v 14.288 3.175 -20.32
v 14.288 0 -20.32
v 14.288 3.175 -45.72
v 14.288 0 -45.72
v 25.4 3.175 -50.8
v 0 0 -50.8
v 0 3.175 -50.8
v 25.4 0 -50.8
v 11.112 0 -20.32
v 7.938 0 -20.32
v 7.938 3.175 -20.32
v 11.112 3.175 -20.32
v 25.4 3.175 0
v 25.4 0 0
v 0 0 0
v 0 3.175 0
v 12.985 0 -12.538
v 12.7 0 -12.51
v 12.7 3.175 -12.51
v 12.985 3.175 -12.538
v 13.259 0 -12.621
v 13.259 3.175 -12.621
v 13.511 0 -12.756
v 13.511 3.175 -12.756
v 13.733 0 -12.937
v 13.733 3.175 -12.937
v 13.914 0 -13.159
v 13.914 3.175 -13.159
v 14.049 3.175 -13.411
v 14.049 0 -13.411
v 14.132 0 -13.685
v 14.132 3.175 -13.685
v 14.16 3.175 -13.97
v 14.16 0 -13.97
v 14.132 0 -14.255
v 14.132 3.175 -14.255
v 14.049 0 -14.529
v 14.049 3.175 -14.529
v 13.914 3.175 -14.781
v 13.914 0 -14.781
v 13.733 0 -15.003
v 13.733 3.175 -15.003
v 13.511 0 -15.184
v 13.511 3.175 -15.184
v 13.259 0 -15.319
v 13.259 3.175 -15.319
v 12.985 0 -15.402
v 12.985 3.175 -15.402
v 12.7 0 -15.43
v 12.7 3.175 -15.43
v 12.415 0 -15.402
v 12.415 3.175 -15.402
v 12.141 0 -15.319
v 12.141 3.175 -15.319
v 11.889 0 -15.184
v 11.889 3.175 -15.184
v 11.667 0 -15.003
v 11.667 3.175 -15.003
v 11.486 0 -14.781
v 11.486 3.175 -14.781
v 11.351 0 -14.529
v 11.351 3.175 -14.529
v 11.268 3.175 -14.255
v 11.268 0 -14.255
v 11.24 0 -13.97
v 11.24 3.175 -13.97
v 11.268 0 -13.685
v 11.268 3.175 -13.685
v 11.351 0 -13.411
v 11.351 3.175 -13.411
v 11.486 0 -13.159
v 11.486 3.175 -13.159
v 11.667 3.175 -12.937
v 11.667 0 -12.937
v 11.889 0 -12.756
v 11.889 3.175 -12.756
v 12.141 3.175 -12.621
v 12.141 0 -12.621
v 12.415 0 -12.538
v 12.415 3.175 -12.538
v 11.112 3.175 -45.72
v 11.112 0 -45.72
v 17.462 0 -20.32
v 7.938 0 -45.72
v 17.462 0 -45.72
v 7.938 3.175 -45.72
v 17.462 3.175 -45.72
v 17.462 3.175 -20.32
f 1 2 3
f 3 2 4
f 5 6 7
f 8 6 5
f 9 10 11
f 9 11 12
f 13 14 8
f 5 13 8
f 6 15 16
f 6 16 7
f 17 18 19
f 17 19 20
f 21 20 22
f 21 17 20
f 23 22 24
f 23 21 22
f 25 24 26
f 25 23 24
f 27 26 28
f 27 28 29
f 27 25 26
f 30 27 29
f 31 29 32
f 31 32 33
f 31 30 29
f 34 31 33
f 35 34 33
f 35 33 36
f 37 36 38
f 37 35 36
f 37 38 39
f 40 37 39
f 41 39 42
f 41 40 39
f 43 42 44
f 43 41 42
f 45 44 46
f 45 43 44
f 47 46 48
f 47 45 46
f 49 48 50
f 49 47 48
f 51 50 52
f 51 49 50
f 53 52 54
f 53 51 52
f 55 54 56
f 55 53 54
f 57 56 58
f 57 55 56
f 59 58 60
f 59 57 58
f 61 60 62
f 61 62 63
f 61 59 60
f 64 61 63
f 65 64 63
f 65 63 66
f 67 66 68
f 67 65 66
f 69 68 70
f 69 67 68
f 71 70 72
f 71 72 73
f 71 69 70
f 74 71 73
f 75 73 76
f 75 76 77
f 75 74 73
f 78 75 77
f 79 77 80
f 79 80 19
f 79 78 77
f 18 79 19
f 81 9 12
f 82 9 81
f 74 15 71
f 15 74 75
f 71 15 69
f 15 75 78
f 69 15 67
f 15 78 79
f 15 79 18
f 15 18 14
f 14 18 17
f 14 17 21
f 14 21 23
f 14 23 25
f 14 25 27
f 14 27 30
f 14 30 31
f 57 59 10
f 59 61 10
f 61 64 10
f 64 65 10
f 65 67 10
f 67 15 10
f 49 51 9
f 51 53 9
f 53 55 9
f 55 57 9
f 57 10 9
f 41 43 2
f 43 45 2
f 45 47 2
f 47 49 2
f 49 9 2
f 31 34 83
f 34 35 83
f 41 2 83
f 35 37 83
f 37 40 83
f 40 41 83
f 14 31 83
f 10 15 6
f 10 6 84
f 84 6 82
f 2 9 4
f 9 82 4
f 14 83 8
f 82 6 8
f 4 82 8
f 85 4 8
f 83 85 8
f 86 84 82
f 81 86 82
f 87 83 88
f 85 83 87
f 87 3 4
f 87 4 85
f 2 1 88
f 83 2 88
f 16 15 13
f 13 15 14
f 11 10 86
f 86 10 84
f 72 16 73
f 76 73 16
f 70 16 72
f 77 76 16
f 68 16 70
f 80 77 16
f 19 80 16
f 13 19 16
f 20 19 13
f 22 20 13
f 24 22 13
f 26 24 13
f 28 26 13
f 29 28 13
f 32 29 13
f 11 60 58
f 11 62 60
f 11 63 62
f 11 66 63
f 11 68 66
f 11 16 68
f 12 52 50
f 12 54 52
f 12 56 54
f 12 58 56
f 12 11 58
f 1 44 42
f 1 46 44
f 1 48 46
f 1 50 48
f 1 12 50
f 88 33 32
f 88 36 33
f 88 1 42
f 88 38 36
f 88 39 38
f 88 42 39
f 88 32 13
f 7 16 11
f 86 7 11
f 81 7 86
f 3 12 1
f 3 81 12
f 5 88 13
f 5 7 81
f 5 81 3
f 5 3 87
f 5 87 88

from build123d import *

# Parameters (mm, degrees)
SKETCH1_W           = 25.4
SKETCH1_H           = 50.8
SKETCH1_R           = 1.4605
SKETCH1_W_2         = 3.175
SKETCH1_H_2         = 25.4
BOSS_EXTRUDE1_DEPTH = 3.175


with BuildPart() as part:
    # Sketch1 → Boss-Extrude1 (new body)
    with BuildSketch(Plane(origin=(0, 0, 0), x_dir=(1, 0, 0), z_dir=(0, 1, 0))):
        with Locations((12.7, 25.4)):
            Rectangle(SKETCH1_W, SKETCH1_H)
        with Locations(Location((12.7, 13.97, 0), (0, 0, 270))):
            Circle(SKETCH1_R, mode=Mode.SUBTRACT)
        with Locations((9.525, 33.02)):
            Rectangle(SKETCH1_W_2, SKETCH1_H_2, mode=Mode.SUBTRACT)
        with Locations((15.875, 33.02)):
            Rectangle(SKETCH1_W_2, SKETCH1_H_2, mode=Mode.SUBTRACT)
    extrude(amount=BOSS_EXTRUDE1_DEPTH)


solid = part.part
